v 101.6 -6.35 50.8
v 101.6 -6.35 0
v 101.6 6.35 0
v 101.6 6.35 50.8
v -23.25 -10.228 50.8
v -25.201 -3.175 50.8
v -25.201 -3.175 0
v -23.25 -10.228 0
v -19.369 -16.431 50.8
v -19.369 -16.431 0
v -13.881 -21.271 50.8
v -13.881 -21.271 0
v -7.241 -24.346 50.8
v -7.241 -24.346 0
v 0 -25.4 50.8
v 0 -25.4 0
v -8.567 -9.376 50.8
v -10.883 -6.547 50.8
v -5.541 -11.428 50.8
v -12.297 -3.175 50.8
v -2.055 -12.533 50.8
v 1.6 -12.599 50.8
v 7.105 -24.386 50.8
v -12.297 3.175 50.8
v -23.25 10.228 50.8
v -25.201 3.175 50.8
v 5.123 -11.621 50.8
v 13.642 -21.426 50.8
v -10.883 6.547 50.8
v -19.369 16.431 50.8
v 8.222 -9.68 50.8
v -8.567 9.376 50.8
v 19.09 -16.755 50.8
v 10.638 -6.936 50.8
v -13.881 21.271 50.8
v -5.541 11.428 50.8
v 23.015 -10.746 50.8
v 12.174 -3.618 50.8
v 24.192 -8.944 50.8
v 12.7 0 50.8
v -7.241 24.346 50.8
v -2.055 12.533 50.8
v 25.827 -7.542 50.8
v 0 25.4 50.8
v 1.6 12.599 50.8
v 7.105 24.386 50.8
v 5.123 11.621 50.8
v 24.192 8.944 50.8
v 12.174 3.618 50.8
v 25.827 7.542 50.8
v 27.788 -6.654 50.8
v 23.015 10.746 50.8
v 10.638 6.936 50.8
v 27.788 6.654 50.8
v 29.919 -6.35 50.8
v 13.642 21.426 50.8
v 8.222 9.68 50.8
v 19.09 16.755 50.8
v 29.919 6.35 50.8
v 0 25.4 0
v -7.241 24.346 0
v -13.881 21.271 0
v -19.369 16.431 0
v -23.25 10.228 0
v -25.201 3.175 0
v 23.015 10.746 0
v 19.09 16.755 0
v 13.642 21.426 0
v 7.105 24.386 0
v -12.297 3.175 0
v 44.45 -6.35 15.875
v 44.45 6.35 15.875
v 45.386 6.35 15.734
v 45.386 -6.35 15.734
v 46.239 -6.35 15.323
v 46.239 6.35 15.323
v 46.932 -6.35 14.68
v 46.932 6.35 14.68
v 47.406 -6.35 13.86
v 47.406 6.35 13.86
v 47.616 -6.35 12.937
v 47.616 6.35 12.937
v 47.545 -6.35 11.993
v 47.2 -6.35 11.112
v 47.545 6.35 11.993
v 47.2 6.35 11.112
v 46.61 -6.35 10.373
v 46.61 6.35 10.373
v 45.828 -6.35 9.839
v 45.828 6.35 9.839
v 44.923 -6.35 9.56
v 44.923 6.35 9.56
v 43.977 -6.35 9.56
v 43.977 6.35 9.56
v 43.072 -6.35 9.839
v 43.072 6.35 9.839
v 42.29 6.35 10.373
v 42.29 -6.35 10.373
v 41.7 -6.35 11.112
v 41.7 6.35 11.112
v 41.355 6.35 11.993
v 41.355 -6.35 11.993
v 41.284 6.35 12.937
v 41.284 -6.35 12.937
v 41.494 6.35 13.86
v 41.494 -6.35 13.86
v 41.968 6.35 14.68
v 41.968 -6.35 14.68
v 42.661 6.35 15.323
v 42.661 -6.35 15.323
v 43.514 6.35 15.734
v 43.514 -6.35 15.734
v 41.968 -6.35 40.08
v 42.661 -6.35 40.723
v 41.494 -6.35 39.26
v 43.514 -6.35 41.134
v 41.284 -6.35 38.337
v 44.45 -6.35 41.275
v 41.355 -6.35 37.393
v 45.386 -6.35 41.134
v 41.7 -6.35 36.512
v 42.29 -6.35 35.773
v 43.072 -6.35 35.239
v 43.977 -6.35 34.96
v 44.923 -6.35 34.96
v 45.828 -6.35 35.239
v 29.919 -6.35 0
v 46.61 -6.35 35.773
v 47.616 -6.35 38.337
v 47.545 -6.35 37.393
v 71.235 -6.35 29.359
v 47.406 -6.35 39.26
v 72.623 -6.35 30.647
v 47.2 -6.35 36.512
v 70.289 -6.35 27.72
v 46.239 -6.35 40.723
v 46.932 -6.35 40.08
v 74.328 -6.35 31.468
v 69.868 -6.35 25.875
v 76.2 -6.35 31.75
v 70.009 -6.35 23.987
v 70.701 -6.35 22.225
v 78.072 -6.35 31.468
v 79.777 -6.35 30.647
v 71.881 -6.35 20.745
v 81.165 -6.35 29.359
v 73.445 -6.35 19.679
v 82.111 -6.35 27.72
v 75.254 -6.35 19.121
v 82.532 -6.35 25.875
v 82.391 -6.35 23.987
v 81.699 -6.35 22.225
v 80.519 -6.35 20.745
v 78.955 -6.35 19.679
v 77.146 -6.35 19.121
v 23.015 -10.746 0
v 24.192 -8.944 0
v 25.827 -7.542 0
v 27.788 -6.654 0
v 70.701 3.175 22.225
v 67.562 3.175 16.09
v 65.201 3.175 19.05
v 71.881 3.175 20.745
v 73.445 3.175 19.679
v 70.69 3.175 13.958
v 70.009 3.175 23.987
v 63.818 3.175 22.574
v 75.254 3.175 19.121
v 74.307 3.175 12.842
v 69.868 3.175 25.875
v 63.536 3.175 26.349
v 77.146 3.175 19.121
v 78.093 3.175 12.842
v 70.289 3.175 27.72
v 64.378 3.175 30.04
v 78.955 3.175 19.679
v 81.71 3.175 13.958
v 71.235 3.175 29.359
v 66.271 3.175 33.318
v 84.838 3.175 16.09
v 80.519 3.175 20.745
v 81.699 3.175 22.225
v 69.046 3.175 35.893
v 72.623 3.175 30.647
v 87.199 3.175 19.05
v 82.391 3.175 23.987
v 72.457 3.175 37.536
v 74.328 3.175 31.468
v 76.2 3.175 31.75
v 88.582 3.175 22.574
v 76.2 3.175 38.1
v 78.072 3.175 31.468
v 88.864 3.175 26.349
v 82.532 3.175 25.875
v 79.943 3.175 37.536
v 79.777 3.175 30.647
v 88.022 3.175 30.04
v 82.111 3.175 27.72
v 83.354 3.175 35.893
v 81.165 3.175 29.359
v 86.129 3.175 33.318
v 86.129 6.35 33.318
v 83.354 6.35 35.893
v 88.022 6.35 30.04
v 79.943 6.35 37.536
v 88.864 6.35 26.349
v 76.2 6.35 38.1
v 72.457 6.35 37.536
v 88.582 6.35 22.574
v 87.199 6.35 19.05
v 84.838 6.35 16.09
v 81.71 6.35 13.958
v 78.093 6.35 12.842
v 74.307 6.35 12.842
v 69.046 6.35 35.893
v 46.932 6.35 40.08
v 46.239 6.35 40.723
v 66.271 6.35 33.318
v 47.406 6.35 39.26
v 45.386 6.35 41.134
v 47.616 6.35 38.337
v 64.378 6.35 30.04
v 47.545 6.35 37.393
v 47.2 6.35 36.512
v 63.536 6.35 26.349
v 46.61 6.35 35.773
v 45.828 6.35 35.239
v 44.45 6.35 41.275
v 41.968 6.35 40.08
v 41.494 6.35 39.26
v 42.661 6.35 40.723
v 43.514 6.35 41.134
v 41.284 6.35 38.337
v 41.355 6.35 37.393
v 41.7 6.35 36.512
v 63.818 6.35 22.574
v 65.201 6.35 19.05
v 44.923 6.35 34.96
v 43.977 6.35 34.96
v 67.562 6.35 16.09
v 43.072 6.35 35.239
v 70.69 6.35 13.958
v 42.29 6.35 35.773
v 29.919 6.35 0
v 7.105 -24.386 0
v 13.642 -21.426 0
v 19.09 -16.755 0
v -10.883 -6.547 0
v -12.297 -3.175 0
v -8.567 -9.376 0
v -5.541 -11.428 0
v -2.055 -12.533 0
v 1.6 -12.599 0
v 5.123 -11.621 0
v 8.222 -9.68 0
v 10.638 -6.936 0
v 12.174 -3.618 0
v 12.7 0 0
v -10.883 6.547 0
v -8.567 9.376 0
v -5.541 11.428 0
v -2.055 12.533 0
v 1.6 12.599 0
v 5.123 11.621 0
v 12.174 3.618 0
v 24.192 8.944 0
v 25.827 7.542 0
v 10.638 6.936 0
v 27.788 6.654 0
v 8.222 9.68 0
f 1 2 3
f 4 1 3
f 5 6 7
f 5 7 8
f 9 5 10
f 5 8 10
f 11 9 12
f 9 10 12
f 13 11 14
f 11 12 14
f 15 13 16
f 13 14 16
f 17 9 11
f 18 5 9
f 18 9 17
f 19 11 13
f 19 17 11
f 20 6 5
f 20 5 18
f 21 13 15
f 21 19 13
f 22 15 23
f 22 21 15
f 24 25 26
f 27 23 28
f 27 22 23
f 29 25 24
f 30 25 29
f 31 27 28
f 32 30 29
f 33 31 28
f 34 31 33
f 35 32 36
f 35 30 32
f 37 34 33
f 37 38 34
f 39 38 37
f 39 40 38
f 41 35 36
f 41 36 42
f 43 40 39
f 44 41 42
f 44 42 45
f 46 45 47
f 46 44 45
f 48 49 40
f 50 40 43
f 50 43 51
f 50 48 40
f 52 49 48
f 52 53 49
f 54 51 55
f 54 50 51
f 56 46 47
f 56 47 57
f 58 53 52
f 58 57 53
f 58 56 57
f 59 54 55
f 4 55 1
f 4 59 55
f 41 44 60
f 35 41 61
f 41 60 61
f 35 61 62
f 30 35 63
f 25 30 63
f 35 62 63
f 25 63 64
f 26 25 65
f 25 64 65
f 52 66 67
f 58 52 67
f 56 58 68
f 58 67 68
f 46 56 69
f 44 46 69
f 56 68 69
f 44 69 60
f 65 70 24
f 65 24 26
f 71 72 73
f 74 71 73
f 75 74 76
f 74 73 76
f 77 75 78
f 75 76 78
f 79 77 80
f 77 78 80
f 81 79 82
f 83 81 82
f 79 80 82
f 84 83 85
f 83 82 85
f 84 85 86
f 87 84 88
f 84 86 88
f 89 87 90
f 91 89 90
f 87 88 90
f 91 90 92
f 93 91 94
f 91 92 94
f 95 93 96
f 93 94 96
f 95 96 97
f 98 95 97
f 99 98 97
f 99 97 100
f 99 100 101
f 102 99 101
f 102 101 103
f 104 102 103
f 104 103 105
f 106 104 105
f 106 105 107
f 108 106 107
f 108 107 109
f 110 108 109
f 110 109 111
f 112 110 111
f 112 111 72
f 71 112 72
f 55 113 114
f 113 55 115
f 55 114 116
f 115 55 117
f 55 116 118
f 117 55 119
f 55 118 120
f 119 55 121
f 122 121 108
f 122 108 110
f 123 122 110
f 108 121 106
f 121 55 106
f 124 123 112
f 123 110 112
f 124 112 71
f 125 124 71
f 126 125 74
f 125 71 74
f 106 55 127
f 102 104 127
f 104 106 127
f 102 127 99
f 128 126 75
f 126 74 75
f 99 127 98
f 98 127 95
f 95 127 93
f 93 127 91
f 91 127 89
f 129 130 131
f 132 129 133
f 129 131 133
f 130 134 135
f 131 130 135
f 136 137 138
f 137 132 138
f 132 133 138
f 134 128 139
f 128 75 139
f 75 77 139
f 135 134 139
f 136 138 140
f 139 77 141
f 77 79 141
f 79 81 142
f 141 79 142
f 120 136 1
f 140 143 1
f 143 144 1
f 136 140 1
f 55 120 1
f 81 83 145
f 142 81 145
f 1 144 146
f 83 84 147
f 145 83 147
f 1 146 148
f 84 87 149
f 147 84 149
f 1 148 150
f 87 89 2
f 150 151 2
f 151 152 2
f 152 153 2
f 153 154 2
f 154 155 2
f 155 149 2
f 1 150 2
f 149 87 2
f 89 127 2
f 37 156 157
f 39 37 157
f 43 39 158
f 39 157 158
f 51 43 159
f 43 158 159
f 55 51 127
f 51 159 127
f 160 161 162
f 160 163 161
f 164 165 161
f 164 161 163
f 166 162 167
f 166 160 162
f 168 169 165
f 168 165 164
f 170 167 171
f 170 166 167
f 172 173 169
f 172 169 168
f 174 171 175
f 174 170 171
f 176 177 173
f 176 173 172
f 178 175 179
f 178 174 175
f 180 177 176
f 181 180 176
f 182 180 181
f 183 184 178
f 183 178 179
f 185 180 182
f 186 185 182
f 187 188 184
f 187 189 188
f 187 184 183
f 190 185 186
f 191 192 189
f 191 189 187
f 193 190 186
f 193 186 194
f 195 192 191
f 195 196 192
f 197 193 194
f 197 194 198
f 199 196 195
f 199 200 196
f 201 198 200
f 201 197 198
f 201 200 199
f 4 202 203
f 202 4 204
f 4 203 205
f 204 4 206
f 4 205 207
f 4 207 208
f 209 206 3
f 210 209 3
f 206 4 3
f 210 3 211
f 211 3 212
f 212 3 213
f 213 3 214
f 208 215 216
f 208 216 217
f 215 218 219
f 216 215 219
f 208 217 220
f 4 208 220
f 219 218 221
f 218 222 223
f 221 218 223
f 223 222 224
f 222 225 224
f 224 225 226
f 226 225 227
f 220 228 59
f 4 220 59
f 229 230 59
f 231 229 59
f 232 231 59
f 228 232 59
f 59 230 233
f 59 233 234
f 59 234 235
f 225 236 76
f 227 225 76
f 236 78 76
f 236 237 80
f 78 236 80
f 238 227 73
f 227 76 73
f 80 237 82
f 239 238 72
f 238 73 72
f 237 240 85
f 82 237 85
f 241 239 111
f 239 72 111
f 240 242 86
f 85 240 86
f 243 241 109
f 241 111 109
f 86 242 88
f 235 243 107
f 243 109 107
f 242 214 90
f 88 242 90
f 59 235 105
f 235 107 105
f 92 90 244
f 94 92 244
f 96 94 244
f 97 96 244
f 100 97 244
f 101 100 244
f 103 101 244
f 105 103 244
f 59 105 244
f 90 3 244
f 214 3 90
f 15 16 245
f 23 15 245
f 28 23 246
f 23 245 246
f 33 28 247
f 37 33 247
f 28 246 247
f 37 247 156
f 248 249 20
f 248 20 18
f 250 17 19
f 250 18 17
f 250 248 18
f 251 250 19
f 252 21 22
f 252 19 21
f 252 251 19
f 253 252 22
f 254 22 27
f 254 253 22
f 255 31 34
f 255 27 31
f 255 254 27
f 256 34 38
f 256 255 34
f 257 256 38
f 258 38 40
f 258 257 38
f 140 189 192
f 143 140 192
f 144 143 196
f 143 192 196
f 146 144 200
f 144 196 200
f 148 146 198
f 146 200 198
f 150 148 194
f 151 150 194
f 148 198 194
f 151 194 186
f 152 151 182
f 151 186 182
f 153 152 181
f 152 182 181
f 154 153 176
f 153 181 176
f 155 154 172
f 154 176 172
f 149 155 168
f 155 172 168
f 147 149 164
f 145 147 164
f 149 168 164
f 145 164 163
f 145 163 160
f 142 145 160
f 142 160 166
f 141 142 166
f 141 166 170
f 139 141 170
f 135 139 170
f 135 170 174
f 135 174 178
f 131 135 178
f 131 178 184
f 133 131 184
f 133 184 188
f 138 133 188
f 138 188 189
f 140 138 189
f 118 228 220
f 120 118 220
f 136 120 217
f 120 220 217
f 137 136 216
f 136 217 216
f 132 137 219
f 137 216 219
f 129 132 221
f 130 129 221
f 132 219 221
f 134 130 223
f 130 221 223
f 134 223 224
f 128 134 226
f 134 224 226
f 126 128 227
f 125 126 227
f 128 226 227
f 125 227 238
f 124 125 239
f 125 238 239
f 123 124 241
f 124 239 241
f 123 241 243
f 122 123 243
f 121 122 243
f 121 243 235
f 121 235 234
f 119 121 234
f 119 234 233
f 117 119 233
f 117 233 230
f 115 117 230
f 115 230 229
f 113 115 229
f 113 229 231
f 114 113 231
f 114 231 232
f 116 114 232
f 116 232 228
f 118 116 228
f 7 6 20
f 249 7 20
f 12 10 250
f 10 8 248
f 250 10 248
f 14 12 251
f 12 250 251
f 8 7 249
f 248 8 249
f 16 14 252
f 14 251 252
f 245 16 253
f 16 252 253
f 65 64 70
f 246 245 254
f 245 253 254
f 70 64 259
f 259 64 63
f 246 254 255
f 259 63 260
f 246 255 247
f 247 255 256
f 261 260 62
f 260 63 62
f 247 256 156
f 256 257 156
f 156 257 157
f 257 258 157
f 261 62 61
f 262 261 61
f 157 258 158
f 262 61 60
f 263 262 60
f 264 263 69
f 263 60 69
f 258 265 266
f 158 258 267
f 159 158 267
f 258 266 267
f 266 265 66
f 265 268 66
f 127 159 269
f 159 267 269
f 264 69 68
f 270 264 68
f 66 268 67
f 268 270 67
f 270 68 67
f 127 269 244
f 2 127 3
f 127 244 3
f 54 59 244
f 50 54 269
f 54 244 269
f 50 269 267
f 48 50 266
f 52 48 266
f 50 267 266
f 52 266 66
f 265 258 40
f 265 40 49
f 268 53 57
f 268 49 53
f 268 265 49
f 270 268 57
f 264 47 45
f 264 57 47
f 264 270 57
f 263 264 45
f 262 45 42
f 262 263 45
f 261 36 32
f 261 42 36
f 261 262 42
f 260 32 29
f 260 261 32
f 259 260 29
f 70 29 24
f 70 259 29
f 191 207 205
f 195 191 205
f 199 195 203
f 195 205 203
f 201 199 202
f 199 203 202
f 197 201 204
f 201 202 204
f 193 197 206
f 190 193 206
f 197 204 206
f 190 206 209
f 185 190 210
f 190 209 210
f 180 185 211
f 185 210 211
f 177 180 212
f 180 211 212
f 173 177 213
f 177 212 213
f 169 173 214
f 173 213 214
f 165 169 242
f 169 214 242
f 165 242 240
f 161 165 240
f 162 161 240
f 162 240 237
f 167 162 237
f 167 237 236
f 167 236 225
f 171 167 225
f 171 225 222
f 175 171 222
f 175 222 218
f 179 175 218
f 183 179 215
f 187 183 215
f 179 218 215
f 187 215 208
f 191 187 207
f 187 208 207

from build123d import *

# Parameters (mm, degrees)
BOSS_EXTRUDE2_DEPTH     = 50.8
SKETCH2_R               = 12.7
CUT_EXTRUDE1_DEPTH      = 3.175
SKETCH3_R               = 6.35
CUT_EXTRUDE2_DEPTH      = 118.131253835
CUT_EXTRUDE3_DEPTH      = 117.397422652
CUT_EXTRUDE3_DEPTH_BACK = 117.397422652
SKETCH5_R               = 3.175
CUT_EXTRUDE4_DEPTH      = 118.946015193


with BuildPart() as part:
    # Sketch1 → Boss-Extrude2 (new body)
    with BuildSketch(Plane.XY):
        with BuildLine():
            Line((29.919216233, -6.35), (24.593444248, -6.35))
            ThreePointArc((24.593444248, -6.35), (23.905382985, -8.584443158), (23.014781645, -10.746154003))
            ThreePointArc((23.014781645, -10.746154003), (25.826619655, -7.542321317), (29.919216233, -6.35))
        make_face()
        with BuildLine():
            ThreePointArc((23.01478179, 10.746153692), (23.905383043, 8.584442996), (24.593444248, 6.35))
            Line((24.593444248, 6.35), (29.919216228, 6.35))
            ThreePointArc((29.919216228, 6.35), (25.826619797, 7.542321227), (23.01478179, 10.746153692))
        make_face()
        with BuildLine():
            Line((29.919216228, 6.35), (24.593444248, 6.35))
            ThreePointArc((24.593444248, 6.35), (25.197554285, 3.200509029), (25.4, 0))
            ThreePointArc((25.4, 0), (25.197554285, -3.200509029), (24.593444248, -6.35))
            Line((24.593444248, -6.35), (29.919216233, -6.35))
            Line((29.919216233, -6.35), (101.6, -6.35))
            Line((101.6, -6.35), (101.6, 6.35))
            Line((101.6, 6.35), (29.919216228, 6.35))
        make_face()
        with BuildLine():
            Line((24.593444248, -6.35), (0, -6.35))
            Line((0, -6.35), (0, -25.4))
            ThreePointArc((0, -25.4), (13.641988278, -21.425595811), (23.014781645, -10.746154003))
            ThreePointArc((23.014781645, -10.746154003), (23.905382985, -8.584443158), (24.593444248, -6.35))
        make_face()
        with BuildLine():
            Line((24.593444248, 6.35), (0, 6.35))
            Line((0, 6.35), (0, -6.35))
            Line((0, -6.35), (24.593444248, -6.35))
            ThreePointArc((24.593444248, -6.35), (25.197554285, -3.200509029), (25.4, 0))
            ThreePointArc((25.4, 0), (25.197554285, 3.200509029), (24.593444248, 6.35))
        make_face()
        with BuildLine():
            Line((0, 25.4), (0, 6.35))
            Line((0, 6.35), (24.593444248, 6.35))
            ThreePointArc((24.593444248, 6.35), (23.905383043, 8.584442996), (23.01478179, 10.746153692))
            ThreePointArc((23.01478179, 10.746153692), (13.641988422, 21.425595718), (0, 25.4))
        make_face()
        with BuildLine():
            Line((0, -6.35), (0, 6.35))
            Line((0, 6.35), (0, 25.4))
            ThreePointArc((0, 25.4), (-25.4, 0), (0, -25.4))
            Line((0, -25.4), (0, -6.35))
        make_face()
    extrude(amount=BOSS_EXTRUDE2_DEPTH)

    # Sketch2 → Cut-Extrude1 (cut)
    with BuildSketch(Plane(origin=(0, 6.35, 0), x_dir=(1, 0, 0), z_dir=(0, 1, 0))):
        with Locations(Location((76.2, -25.4, 0), (0, 0, 270))):
            Circle(SKETCH2_R)
    extrude(amount=-CUT_EXTRUDE1_DEPTH, mode=Mode.SUBTRACT)

    # Sketch3 → Cut-Extrude2 (cut, through all)
    with BuildSketch(Plane(origin=(0, 3.175, 0), x_dir=(1, 0, 0), z_dir=(0, 1, 0))):
        with Locations(Location((76.2, -25.4, 0), (0, 0, 270))):
            Circle(SKETCH3_R)
    extrude(amount=-CUT_EXTRUDE2_DEPTH, mode=Mode.SUBTRACT)

    # Sketch4 → Cut-Extrude3 (cut, two sides: drawn at the far end of the back side and taken through both)
    with BuildSketch(Plane.XY.offset(50.8).offset(-CUT_EXTRUDE3_DEPTH_BACK)):
        with BuildLine():
            Line((-12.296722124, 3.175), (-25.200781238, 3.175))
            ThreePointArc((-25.200781238, 3.175), (-25.350146385, 1.590621979), (-25.4, 0))
            ThreePointArc((-25.4, 0), (-25.350146385, -1.590621979), (-25.200781238, -3.175))
            Line((-25.200781238, -3.175), (-12.296722124, -3.175))
            ThreePointArc((-12.296722124, -3.175), (-12.7, 0), (-12.296722124, 3.175))
        make_face()
        with BuildLine():
            ThreePointArc((12.7, 0), (1.600254515, 12.598777143), (-12.296722124, 3.175))
            Line((-12.296722124, 3.175), (0, 3.175))
            Line((0, 3.175), (0, -3.175))
            Line((0, -3.175), (-12.296722124, -3.175))
            ThreePointArc((-12.296722124, -3.175), (1.600254515, -12.598777143), (12.7, 0))
        make_face()
        with BuildLine():
            Line((0, 3.175), (-12.296722124, 3.175))
            ThreePointArc((-12.296722124, 3.175), (-12.7, 0), (-12.296722124, -3.175))
            Line((-12.296722124, -3.175), (0, -3.175))
            Line((0, -3.175), (0, 3.175))
        make_face()
    extrude(amount=CUT_EXTRUDE3_DEPTH + CUT_EXTRUDE3_DEPTH_BACK, mode=Mode.SUBTRACT)

    # Sketch5 → Cut-Extrude4 (cut, through all)
    with BuildSketch(Plane(origin=(0, 6.35, 0), x_dir=(1, 0, 0), z_dir=(0, 1, 0))):
        with Locations(Location((44.45, -12.7, 0), (0, 0, 270))):
            Circle(SKETCH5_R)
        with Locations(Location((44.45, -38.1, 0), (0, 0, 270))):
            Circle(SKETCH5_R)
    extrude(amount=-CUT_EXTRUDE4_DEPTH, mode=Mode.SUBTRACT)


solid = part.part
